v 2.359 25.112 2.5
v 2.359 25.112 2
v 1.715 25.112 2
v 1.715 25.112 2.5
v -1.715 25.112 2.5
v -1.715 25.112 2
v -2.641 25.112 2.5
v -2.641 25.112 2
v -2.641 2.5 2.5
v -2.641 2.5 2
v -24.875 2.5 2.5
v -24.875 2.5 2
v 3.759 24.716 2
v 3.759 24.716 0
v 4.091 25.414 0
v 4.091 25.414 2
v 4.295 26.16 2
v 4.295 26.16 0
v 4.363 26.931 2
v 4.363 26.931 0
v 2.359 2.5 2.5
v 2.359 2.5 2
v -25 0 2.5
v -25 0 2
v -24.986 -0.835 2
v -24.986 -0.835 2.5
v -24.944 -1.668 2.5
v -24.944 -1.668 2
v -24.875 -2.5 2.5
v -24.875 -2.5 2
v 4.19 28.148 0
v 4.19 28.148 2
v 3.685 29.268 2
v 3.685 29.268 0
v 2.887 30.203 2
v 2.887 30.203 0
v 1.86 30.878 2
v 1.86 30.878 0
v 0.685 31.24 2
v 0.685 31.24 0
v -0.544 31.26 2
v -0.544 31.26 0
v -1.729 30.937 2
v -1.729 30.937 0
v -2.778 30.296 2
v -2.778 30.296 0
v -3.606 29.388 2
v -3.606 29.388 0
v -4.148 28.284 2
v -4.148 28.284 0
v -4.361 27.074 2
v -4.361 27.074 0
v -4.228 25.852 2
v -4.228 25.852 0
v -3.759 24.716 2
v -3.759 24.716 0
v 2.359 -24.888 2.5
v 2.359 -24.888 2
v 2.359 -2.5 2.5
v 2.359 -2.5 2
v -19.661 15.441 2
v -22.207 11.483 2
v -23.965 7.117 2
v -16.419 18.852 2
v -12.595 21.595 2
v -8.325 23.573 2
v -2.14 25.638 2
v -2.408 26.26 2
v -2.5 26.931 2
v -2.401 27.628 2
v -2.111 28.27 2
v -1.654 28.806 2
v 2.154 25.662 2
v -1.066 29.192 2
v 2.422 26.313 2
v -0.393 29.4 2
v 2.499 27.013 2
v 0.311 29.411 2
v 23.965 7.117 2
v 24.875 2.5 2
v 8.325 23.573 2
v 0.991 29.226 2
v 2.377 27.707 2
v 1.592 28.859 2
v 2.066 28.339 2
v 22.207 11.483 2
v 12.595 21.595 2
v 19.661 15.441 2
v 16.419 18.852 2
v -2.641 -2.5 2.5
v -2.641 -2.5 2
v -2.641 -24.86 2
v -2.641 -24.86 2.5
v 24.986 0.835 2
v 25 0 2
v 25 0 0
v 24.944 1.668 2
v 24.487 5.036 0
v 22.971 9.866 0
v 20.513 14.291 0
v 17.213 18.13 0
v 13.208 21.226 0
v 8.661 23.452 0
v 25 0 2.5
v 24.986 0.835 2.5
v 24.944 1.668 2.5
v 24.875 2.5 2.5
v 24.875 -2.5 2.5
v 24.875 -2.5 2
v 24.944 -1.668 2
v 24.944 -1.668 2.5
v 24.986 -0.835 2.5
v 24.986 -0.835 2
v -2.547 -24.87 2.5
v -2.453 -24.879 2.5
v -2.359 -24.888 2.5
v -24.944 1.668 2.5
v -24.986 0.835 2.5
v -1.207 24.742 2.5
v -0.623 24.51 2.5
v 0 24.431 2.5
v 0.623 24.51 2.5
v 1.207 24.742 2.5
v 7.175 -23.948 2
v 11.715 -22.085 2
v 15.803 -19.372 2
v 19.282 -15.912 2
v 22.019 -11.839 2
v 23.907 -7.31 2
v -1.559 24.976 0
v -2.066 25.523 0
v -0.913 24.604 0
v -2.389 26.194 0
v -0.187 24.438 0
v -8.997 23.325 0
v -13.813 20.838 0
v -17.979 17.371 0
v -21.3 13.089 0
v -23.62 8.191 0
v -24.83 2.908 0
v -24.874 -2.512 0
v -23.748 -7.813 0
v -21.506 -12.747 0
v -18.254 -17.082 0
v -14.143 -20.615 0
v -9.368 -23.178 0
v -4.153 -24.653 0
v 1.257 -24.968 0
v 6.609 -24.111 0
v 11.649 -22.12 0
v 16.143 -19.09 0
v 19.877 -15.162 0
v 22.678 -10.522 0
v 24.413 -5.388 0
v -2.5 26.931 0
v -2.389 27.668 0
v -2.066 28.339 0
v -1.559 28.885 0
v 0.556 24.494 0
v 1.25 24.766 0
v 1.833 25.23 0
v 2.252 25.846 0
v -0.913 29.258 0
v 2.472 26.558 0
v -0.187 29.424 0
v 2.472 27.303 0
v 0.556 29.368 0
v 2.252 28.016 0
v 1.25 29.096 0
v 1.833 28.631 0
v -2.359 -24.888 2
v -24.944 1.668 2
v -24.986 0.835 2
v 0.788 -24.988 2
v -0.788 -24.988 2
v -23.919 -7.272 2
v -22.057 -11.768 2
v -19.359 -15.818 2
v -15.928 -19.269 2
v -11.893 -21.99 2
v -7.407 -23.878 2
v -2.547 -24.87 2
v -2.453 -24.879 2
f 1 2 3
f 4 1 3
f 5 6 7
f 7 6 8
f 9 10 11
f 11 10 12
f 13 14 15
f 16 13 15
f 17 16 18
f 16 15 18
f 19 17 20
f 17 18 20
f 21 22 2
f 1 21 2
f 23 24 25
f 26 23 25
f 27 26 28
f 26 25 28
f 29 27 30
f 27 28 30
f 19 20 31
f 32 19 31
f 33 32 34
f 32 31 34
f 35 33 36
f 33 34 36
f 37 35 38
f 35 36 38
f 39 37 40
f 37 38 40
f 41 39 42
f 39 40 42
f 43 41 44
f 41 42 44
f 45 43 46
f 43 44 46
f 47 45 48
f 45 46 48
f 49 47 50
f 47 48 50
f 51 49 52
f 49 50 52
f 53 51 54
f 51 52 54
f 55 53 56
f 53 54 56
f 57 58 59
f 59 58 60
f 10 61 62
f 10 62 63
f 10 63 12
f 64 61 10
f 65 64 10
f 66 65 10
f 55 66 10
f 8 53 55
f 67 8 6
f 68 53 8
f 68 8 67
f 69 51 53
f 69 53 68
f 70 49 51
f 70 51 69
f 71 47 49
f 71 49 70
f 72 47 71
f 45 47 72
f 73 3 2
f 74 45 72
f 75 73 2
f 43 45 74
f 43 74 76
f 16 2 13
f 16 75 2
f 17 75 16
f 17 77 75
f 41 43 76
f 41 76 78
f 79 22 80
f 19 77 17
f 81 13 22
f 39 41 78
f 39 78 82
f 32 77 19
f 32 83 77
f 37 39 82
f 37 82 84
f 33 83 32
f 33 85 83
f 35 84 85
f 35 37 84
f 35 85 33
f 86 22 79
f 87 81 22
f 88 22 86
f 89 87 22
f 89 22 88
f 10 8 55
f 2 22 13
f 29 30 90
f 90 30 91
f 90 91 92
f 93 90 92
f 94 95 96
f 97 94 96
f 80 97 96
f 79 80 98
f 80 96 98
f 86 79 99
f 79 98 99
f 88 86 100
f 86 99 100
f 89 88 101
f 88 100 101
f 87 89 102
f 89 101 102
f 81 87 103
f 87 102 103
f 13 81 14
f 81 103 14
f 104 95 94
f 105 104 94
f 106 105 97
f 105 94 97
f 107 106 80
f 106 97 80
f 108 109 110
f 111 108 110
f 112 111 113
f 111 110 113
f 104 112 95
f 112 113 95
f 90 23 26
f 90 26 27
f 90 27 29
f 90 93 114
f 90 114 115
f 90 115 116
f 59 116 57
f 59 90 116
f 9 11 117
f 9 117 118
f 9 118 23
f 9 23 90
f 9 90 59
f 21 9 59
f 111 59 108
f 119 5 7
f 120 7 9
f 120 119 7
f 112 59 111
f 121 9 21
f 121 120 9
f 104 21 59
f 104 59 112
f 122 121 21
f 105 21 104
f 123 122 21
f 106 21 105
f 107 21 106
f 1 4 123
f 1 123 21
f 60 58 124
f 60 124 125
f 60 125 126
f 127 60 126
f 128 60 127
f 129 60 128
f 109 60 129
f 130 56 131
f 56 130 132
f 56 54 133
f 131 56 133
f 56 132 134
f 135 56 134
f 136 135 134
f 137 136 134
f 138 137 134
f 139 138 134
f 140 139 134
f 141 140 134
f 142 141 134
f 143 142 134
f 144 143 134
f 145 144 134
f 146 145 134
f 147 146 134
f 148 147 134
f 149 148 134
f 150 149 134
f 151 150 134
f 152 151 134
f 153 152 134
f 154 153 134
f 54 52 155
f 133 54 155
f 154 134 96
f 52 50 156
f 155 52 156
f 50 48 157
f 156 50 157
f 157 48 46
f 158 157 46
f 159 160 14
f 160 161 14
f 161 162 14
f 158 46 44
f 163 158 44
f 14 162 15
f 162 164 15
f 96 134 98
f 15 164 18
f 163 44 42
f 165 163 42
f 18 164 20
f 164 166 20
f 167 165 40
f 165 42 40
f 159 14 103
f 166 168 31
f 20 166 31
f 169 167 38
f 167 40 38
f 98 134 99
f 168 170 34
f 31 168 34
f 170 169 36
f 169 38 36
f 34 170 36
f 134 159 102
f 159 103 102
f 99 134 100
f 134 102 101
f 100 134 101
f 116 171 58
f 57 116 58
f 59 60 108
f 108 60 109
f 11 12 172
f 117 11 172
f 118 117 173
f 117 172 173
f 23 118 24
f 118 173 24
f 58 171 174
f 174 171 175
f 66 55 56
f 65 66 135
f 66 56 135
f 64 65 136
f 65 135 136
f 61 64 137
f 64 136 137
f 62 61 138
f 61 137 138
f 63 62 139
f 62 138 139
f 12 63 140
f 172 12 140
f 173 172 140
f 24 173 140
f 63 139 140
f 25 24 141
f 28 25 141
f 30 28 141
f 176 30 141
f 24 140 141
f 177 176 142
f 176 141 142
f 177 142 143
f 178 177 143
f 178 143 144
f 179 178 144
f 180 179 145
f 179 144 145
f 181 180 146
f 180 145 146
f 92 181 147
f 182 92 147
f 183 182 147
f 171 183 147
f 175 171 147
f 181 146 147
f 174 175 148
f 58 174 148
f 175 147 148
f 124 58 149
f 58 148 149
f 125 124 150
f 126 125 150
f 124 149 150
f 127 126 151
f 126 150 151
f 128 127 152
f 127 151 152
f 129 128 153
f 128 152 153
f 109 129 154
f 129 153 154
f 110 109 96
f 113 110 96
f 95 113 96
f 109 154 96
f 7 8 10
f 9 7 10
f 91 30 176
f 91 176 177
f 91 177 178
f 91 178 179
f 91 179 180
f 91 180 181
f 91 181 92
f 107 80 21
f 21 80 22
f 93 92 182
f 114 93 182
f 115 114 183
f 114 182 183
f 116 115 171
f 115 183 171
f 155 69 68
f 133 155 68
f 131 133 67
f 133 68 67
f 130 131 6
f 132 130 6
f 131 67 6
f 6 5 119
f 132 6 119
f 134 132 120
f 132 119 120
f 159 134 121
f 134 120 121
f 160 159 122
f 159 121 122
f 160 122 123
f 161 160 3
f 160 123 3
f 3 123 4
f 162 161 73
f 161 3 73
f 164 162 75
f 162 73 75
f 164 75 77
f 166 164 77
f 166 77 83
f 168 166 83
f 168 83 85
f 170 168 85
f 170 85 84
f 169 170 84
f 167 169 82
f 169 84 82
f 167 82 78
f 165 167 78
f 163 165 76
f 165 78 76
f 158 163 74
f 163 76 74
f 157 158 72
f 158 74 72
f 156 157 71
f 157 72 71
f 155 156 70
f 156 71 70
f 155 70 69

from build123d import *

# Parameters (mm, degrees)
F1_DEPTH = 2
F2_W     = 5
F2_H     = 5
F3_DEPTH = 0.5
F4_D     = 5


# Not quite as in the source:
# - a feature names something its author has since deleted; it is built from what else it names


with BuildPart() as f1:
    # F0 (on Top) → F1 (new body)
    with BuildSketch(Plane.XY):
        with BuildLine():
            ThreePointArc((-3.7594057481, 24.7157210783), (0, 25), (3.7594057481, 24.7157210783))
            ThreePointArc((3.7594057481, 24.7157210783), (4.209761495, 25.7828537011), (4.3634907466, 26.9308779389))
            ThreePointArc((4.3634907466, 26.9308779389), (-1.1480242378, 31.1406394339), (-3.7594057481, 24.7157210783))
        make_face()
        with BuildLine():
            ThreePointArc((-3.7594057481, 24.7157210783), (0, 22.5673871923), (3.7594057481, 24.7157210783))
            ThreePointArc((3.7594057481, 24.7157210783), (0, 25), (-3.7594057481, 24.7157210783))
        make_face()
        with BuildLine():
            ThreePointArc((-3.7594057481, 24.7157210783), (-16.2943986741, -18.9602893399), (25, 0))
            ThreePointArc((25, 0), (18.9602893399, 16.2943986741), (3.7594057481, 24.7157210783))
            ThreePointArc((3.7594057481, 24.7157210783), (0, 22.5673871923), (-3.7594057481, 24.7157210783))
        make_face()
    extrude(amount=F1_DEPTH)

    # F2 (on face) → F3 (join)
    with BuildSketch(Plane.XY.offset(2)):
        Polygon((-2.640592387, 25.1115851104), (-2.640592387, 2.5), (2.359407613, 2.5), (2.359407613, 25.1115851104), (-0.140592387, 25.1115851104), align=None)
        with BuildLine():
            Line((-2.640592387, 2.5), (-24.8746859277, 2.5))
            ThreePointArc((-24.8746859277, 2.5), (-24.9686518278, 1.2515693765), (-25, 0))
            ThreePointArc((-25, 0), (-24.9686518278, -1.2515693765), (-24.8746859277, -2.5))
            Line((-24.8746859277, -2.5), (-2.640592387, -2.5))
            Line((-2.640592387, -2.5), (-2.640592387, 2.5))
        make_face()
        with Locations((-0.140592387, 0)):
            Rectangle(F2_W, F2_H)
        with BuildLine():
            Line((24.8746859277, 2.5), (2.359407613, 2.5))
            Line((2.359407613, 2.5), (2.359407613, -2.5))
            Line((2.359407613, -2.5), (24.8746859277, -2.5))
            ThreePointArc((24.8746859277, -2.5), (24.9686518278, -1.2515693765), (25, 0))
            ThreePointArc((25, 0), (24.9686518278, 1.2515693765), (24.8746859277, 2.5))
        make_face()
        with BuildLine():
            Line((2.359407613, -2.5), (-2.640592387, -2.5))
            Line((-2.640592387, -2.5), (-2.640592387, -24.8601543005))
            ThreePointArc((-2.640592387, -24.8601543005), (-2.5000399327, -24.8746819142), (-2.359407613, -24.8884148896))
            Line((-2.359407613, -24.8884148896), (-0.140592387, -24.8884148896))
            Line((-0.140592387, -24.8884148896), (2.359407613, -24.8884148896))
            Line((2.359407613, -24.8884148896), (2.359407613, -2.5))
        make_face()
    extrude(amount=F3_DEPTH)

    # F4 (through all)
    with Locations(Plane(origin=(0, 0, 0), x_dir=(1, 0, 0), z_dir=(0, 0, -1))):
        with Locations((0, -26.9308779389)):
            Hole(F4_D / 2)


solid = f1.part
